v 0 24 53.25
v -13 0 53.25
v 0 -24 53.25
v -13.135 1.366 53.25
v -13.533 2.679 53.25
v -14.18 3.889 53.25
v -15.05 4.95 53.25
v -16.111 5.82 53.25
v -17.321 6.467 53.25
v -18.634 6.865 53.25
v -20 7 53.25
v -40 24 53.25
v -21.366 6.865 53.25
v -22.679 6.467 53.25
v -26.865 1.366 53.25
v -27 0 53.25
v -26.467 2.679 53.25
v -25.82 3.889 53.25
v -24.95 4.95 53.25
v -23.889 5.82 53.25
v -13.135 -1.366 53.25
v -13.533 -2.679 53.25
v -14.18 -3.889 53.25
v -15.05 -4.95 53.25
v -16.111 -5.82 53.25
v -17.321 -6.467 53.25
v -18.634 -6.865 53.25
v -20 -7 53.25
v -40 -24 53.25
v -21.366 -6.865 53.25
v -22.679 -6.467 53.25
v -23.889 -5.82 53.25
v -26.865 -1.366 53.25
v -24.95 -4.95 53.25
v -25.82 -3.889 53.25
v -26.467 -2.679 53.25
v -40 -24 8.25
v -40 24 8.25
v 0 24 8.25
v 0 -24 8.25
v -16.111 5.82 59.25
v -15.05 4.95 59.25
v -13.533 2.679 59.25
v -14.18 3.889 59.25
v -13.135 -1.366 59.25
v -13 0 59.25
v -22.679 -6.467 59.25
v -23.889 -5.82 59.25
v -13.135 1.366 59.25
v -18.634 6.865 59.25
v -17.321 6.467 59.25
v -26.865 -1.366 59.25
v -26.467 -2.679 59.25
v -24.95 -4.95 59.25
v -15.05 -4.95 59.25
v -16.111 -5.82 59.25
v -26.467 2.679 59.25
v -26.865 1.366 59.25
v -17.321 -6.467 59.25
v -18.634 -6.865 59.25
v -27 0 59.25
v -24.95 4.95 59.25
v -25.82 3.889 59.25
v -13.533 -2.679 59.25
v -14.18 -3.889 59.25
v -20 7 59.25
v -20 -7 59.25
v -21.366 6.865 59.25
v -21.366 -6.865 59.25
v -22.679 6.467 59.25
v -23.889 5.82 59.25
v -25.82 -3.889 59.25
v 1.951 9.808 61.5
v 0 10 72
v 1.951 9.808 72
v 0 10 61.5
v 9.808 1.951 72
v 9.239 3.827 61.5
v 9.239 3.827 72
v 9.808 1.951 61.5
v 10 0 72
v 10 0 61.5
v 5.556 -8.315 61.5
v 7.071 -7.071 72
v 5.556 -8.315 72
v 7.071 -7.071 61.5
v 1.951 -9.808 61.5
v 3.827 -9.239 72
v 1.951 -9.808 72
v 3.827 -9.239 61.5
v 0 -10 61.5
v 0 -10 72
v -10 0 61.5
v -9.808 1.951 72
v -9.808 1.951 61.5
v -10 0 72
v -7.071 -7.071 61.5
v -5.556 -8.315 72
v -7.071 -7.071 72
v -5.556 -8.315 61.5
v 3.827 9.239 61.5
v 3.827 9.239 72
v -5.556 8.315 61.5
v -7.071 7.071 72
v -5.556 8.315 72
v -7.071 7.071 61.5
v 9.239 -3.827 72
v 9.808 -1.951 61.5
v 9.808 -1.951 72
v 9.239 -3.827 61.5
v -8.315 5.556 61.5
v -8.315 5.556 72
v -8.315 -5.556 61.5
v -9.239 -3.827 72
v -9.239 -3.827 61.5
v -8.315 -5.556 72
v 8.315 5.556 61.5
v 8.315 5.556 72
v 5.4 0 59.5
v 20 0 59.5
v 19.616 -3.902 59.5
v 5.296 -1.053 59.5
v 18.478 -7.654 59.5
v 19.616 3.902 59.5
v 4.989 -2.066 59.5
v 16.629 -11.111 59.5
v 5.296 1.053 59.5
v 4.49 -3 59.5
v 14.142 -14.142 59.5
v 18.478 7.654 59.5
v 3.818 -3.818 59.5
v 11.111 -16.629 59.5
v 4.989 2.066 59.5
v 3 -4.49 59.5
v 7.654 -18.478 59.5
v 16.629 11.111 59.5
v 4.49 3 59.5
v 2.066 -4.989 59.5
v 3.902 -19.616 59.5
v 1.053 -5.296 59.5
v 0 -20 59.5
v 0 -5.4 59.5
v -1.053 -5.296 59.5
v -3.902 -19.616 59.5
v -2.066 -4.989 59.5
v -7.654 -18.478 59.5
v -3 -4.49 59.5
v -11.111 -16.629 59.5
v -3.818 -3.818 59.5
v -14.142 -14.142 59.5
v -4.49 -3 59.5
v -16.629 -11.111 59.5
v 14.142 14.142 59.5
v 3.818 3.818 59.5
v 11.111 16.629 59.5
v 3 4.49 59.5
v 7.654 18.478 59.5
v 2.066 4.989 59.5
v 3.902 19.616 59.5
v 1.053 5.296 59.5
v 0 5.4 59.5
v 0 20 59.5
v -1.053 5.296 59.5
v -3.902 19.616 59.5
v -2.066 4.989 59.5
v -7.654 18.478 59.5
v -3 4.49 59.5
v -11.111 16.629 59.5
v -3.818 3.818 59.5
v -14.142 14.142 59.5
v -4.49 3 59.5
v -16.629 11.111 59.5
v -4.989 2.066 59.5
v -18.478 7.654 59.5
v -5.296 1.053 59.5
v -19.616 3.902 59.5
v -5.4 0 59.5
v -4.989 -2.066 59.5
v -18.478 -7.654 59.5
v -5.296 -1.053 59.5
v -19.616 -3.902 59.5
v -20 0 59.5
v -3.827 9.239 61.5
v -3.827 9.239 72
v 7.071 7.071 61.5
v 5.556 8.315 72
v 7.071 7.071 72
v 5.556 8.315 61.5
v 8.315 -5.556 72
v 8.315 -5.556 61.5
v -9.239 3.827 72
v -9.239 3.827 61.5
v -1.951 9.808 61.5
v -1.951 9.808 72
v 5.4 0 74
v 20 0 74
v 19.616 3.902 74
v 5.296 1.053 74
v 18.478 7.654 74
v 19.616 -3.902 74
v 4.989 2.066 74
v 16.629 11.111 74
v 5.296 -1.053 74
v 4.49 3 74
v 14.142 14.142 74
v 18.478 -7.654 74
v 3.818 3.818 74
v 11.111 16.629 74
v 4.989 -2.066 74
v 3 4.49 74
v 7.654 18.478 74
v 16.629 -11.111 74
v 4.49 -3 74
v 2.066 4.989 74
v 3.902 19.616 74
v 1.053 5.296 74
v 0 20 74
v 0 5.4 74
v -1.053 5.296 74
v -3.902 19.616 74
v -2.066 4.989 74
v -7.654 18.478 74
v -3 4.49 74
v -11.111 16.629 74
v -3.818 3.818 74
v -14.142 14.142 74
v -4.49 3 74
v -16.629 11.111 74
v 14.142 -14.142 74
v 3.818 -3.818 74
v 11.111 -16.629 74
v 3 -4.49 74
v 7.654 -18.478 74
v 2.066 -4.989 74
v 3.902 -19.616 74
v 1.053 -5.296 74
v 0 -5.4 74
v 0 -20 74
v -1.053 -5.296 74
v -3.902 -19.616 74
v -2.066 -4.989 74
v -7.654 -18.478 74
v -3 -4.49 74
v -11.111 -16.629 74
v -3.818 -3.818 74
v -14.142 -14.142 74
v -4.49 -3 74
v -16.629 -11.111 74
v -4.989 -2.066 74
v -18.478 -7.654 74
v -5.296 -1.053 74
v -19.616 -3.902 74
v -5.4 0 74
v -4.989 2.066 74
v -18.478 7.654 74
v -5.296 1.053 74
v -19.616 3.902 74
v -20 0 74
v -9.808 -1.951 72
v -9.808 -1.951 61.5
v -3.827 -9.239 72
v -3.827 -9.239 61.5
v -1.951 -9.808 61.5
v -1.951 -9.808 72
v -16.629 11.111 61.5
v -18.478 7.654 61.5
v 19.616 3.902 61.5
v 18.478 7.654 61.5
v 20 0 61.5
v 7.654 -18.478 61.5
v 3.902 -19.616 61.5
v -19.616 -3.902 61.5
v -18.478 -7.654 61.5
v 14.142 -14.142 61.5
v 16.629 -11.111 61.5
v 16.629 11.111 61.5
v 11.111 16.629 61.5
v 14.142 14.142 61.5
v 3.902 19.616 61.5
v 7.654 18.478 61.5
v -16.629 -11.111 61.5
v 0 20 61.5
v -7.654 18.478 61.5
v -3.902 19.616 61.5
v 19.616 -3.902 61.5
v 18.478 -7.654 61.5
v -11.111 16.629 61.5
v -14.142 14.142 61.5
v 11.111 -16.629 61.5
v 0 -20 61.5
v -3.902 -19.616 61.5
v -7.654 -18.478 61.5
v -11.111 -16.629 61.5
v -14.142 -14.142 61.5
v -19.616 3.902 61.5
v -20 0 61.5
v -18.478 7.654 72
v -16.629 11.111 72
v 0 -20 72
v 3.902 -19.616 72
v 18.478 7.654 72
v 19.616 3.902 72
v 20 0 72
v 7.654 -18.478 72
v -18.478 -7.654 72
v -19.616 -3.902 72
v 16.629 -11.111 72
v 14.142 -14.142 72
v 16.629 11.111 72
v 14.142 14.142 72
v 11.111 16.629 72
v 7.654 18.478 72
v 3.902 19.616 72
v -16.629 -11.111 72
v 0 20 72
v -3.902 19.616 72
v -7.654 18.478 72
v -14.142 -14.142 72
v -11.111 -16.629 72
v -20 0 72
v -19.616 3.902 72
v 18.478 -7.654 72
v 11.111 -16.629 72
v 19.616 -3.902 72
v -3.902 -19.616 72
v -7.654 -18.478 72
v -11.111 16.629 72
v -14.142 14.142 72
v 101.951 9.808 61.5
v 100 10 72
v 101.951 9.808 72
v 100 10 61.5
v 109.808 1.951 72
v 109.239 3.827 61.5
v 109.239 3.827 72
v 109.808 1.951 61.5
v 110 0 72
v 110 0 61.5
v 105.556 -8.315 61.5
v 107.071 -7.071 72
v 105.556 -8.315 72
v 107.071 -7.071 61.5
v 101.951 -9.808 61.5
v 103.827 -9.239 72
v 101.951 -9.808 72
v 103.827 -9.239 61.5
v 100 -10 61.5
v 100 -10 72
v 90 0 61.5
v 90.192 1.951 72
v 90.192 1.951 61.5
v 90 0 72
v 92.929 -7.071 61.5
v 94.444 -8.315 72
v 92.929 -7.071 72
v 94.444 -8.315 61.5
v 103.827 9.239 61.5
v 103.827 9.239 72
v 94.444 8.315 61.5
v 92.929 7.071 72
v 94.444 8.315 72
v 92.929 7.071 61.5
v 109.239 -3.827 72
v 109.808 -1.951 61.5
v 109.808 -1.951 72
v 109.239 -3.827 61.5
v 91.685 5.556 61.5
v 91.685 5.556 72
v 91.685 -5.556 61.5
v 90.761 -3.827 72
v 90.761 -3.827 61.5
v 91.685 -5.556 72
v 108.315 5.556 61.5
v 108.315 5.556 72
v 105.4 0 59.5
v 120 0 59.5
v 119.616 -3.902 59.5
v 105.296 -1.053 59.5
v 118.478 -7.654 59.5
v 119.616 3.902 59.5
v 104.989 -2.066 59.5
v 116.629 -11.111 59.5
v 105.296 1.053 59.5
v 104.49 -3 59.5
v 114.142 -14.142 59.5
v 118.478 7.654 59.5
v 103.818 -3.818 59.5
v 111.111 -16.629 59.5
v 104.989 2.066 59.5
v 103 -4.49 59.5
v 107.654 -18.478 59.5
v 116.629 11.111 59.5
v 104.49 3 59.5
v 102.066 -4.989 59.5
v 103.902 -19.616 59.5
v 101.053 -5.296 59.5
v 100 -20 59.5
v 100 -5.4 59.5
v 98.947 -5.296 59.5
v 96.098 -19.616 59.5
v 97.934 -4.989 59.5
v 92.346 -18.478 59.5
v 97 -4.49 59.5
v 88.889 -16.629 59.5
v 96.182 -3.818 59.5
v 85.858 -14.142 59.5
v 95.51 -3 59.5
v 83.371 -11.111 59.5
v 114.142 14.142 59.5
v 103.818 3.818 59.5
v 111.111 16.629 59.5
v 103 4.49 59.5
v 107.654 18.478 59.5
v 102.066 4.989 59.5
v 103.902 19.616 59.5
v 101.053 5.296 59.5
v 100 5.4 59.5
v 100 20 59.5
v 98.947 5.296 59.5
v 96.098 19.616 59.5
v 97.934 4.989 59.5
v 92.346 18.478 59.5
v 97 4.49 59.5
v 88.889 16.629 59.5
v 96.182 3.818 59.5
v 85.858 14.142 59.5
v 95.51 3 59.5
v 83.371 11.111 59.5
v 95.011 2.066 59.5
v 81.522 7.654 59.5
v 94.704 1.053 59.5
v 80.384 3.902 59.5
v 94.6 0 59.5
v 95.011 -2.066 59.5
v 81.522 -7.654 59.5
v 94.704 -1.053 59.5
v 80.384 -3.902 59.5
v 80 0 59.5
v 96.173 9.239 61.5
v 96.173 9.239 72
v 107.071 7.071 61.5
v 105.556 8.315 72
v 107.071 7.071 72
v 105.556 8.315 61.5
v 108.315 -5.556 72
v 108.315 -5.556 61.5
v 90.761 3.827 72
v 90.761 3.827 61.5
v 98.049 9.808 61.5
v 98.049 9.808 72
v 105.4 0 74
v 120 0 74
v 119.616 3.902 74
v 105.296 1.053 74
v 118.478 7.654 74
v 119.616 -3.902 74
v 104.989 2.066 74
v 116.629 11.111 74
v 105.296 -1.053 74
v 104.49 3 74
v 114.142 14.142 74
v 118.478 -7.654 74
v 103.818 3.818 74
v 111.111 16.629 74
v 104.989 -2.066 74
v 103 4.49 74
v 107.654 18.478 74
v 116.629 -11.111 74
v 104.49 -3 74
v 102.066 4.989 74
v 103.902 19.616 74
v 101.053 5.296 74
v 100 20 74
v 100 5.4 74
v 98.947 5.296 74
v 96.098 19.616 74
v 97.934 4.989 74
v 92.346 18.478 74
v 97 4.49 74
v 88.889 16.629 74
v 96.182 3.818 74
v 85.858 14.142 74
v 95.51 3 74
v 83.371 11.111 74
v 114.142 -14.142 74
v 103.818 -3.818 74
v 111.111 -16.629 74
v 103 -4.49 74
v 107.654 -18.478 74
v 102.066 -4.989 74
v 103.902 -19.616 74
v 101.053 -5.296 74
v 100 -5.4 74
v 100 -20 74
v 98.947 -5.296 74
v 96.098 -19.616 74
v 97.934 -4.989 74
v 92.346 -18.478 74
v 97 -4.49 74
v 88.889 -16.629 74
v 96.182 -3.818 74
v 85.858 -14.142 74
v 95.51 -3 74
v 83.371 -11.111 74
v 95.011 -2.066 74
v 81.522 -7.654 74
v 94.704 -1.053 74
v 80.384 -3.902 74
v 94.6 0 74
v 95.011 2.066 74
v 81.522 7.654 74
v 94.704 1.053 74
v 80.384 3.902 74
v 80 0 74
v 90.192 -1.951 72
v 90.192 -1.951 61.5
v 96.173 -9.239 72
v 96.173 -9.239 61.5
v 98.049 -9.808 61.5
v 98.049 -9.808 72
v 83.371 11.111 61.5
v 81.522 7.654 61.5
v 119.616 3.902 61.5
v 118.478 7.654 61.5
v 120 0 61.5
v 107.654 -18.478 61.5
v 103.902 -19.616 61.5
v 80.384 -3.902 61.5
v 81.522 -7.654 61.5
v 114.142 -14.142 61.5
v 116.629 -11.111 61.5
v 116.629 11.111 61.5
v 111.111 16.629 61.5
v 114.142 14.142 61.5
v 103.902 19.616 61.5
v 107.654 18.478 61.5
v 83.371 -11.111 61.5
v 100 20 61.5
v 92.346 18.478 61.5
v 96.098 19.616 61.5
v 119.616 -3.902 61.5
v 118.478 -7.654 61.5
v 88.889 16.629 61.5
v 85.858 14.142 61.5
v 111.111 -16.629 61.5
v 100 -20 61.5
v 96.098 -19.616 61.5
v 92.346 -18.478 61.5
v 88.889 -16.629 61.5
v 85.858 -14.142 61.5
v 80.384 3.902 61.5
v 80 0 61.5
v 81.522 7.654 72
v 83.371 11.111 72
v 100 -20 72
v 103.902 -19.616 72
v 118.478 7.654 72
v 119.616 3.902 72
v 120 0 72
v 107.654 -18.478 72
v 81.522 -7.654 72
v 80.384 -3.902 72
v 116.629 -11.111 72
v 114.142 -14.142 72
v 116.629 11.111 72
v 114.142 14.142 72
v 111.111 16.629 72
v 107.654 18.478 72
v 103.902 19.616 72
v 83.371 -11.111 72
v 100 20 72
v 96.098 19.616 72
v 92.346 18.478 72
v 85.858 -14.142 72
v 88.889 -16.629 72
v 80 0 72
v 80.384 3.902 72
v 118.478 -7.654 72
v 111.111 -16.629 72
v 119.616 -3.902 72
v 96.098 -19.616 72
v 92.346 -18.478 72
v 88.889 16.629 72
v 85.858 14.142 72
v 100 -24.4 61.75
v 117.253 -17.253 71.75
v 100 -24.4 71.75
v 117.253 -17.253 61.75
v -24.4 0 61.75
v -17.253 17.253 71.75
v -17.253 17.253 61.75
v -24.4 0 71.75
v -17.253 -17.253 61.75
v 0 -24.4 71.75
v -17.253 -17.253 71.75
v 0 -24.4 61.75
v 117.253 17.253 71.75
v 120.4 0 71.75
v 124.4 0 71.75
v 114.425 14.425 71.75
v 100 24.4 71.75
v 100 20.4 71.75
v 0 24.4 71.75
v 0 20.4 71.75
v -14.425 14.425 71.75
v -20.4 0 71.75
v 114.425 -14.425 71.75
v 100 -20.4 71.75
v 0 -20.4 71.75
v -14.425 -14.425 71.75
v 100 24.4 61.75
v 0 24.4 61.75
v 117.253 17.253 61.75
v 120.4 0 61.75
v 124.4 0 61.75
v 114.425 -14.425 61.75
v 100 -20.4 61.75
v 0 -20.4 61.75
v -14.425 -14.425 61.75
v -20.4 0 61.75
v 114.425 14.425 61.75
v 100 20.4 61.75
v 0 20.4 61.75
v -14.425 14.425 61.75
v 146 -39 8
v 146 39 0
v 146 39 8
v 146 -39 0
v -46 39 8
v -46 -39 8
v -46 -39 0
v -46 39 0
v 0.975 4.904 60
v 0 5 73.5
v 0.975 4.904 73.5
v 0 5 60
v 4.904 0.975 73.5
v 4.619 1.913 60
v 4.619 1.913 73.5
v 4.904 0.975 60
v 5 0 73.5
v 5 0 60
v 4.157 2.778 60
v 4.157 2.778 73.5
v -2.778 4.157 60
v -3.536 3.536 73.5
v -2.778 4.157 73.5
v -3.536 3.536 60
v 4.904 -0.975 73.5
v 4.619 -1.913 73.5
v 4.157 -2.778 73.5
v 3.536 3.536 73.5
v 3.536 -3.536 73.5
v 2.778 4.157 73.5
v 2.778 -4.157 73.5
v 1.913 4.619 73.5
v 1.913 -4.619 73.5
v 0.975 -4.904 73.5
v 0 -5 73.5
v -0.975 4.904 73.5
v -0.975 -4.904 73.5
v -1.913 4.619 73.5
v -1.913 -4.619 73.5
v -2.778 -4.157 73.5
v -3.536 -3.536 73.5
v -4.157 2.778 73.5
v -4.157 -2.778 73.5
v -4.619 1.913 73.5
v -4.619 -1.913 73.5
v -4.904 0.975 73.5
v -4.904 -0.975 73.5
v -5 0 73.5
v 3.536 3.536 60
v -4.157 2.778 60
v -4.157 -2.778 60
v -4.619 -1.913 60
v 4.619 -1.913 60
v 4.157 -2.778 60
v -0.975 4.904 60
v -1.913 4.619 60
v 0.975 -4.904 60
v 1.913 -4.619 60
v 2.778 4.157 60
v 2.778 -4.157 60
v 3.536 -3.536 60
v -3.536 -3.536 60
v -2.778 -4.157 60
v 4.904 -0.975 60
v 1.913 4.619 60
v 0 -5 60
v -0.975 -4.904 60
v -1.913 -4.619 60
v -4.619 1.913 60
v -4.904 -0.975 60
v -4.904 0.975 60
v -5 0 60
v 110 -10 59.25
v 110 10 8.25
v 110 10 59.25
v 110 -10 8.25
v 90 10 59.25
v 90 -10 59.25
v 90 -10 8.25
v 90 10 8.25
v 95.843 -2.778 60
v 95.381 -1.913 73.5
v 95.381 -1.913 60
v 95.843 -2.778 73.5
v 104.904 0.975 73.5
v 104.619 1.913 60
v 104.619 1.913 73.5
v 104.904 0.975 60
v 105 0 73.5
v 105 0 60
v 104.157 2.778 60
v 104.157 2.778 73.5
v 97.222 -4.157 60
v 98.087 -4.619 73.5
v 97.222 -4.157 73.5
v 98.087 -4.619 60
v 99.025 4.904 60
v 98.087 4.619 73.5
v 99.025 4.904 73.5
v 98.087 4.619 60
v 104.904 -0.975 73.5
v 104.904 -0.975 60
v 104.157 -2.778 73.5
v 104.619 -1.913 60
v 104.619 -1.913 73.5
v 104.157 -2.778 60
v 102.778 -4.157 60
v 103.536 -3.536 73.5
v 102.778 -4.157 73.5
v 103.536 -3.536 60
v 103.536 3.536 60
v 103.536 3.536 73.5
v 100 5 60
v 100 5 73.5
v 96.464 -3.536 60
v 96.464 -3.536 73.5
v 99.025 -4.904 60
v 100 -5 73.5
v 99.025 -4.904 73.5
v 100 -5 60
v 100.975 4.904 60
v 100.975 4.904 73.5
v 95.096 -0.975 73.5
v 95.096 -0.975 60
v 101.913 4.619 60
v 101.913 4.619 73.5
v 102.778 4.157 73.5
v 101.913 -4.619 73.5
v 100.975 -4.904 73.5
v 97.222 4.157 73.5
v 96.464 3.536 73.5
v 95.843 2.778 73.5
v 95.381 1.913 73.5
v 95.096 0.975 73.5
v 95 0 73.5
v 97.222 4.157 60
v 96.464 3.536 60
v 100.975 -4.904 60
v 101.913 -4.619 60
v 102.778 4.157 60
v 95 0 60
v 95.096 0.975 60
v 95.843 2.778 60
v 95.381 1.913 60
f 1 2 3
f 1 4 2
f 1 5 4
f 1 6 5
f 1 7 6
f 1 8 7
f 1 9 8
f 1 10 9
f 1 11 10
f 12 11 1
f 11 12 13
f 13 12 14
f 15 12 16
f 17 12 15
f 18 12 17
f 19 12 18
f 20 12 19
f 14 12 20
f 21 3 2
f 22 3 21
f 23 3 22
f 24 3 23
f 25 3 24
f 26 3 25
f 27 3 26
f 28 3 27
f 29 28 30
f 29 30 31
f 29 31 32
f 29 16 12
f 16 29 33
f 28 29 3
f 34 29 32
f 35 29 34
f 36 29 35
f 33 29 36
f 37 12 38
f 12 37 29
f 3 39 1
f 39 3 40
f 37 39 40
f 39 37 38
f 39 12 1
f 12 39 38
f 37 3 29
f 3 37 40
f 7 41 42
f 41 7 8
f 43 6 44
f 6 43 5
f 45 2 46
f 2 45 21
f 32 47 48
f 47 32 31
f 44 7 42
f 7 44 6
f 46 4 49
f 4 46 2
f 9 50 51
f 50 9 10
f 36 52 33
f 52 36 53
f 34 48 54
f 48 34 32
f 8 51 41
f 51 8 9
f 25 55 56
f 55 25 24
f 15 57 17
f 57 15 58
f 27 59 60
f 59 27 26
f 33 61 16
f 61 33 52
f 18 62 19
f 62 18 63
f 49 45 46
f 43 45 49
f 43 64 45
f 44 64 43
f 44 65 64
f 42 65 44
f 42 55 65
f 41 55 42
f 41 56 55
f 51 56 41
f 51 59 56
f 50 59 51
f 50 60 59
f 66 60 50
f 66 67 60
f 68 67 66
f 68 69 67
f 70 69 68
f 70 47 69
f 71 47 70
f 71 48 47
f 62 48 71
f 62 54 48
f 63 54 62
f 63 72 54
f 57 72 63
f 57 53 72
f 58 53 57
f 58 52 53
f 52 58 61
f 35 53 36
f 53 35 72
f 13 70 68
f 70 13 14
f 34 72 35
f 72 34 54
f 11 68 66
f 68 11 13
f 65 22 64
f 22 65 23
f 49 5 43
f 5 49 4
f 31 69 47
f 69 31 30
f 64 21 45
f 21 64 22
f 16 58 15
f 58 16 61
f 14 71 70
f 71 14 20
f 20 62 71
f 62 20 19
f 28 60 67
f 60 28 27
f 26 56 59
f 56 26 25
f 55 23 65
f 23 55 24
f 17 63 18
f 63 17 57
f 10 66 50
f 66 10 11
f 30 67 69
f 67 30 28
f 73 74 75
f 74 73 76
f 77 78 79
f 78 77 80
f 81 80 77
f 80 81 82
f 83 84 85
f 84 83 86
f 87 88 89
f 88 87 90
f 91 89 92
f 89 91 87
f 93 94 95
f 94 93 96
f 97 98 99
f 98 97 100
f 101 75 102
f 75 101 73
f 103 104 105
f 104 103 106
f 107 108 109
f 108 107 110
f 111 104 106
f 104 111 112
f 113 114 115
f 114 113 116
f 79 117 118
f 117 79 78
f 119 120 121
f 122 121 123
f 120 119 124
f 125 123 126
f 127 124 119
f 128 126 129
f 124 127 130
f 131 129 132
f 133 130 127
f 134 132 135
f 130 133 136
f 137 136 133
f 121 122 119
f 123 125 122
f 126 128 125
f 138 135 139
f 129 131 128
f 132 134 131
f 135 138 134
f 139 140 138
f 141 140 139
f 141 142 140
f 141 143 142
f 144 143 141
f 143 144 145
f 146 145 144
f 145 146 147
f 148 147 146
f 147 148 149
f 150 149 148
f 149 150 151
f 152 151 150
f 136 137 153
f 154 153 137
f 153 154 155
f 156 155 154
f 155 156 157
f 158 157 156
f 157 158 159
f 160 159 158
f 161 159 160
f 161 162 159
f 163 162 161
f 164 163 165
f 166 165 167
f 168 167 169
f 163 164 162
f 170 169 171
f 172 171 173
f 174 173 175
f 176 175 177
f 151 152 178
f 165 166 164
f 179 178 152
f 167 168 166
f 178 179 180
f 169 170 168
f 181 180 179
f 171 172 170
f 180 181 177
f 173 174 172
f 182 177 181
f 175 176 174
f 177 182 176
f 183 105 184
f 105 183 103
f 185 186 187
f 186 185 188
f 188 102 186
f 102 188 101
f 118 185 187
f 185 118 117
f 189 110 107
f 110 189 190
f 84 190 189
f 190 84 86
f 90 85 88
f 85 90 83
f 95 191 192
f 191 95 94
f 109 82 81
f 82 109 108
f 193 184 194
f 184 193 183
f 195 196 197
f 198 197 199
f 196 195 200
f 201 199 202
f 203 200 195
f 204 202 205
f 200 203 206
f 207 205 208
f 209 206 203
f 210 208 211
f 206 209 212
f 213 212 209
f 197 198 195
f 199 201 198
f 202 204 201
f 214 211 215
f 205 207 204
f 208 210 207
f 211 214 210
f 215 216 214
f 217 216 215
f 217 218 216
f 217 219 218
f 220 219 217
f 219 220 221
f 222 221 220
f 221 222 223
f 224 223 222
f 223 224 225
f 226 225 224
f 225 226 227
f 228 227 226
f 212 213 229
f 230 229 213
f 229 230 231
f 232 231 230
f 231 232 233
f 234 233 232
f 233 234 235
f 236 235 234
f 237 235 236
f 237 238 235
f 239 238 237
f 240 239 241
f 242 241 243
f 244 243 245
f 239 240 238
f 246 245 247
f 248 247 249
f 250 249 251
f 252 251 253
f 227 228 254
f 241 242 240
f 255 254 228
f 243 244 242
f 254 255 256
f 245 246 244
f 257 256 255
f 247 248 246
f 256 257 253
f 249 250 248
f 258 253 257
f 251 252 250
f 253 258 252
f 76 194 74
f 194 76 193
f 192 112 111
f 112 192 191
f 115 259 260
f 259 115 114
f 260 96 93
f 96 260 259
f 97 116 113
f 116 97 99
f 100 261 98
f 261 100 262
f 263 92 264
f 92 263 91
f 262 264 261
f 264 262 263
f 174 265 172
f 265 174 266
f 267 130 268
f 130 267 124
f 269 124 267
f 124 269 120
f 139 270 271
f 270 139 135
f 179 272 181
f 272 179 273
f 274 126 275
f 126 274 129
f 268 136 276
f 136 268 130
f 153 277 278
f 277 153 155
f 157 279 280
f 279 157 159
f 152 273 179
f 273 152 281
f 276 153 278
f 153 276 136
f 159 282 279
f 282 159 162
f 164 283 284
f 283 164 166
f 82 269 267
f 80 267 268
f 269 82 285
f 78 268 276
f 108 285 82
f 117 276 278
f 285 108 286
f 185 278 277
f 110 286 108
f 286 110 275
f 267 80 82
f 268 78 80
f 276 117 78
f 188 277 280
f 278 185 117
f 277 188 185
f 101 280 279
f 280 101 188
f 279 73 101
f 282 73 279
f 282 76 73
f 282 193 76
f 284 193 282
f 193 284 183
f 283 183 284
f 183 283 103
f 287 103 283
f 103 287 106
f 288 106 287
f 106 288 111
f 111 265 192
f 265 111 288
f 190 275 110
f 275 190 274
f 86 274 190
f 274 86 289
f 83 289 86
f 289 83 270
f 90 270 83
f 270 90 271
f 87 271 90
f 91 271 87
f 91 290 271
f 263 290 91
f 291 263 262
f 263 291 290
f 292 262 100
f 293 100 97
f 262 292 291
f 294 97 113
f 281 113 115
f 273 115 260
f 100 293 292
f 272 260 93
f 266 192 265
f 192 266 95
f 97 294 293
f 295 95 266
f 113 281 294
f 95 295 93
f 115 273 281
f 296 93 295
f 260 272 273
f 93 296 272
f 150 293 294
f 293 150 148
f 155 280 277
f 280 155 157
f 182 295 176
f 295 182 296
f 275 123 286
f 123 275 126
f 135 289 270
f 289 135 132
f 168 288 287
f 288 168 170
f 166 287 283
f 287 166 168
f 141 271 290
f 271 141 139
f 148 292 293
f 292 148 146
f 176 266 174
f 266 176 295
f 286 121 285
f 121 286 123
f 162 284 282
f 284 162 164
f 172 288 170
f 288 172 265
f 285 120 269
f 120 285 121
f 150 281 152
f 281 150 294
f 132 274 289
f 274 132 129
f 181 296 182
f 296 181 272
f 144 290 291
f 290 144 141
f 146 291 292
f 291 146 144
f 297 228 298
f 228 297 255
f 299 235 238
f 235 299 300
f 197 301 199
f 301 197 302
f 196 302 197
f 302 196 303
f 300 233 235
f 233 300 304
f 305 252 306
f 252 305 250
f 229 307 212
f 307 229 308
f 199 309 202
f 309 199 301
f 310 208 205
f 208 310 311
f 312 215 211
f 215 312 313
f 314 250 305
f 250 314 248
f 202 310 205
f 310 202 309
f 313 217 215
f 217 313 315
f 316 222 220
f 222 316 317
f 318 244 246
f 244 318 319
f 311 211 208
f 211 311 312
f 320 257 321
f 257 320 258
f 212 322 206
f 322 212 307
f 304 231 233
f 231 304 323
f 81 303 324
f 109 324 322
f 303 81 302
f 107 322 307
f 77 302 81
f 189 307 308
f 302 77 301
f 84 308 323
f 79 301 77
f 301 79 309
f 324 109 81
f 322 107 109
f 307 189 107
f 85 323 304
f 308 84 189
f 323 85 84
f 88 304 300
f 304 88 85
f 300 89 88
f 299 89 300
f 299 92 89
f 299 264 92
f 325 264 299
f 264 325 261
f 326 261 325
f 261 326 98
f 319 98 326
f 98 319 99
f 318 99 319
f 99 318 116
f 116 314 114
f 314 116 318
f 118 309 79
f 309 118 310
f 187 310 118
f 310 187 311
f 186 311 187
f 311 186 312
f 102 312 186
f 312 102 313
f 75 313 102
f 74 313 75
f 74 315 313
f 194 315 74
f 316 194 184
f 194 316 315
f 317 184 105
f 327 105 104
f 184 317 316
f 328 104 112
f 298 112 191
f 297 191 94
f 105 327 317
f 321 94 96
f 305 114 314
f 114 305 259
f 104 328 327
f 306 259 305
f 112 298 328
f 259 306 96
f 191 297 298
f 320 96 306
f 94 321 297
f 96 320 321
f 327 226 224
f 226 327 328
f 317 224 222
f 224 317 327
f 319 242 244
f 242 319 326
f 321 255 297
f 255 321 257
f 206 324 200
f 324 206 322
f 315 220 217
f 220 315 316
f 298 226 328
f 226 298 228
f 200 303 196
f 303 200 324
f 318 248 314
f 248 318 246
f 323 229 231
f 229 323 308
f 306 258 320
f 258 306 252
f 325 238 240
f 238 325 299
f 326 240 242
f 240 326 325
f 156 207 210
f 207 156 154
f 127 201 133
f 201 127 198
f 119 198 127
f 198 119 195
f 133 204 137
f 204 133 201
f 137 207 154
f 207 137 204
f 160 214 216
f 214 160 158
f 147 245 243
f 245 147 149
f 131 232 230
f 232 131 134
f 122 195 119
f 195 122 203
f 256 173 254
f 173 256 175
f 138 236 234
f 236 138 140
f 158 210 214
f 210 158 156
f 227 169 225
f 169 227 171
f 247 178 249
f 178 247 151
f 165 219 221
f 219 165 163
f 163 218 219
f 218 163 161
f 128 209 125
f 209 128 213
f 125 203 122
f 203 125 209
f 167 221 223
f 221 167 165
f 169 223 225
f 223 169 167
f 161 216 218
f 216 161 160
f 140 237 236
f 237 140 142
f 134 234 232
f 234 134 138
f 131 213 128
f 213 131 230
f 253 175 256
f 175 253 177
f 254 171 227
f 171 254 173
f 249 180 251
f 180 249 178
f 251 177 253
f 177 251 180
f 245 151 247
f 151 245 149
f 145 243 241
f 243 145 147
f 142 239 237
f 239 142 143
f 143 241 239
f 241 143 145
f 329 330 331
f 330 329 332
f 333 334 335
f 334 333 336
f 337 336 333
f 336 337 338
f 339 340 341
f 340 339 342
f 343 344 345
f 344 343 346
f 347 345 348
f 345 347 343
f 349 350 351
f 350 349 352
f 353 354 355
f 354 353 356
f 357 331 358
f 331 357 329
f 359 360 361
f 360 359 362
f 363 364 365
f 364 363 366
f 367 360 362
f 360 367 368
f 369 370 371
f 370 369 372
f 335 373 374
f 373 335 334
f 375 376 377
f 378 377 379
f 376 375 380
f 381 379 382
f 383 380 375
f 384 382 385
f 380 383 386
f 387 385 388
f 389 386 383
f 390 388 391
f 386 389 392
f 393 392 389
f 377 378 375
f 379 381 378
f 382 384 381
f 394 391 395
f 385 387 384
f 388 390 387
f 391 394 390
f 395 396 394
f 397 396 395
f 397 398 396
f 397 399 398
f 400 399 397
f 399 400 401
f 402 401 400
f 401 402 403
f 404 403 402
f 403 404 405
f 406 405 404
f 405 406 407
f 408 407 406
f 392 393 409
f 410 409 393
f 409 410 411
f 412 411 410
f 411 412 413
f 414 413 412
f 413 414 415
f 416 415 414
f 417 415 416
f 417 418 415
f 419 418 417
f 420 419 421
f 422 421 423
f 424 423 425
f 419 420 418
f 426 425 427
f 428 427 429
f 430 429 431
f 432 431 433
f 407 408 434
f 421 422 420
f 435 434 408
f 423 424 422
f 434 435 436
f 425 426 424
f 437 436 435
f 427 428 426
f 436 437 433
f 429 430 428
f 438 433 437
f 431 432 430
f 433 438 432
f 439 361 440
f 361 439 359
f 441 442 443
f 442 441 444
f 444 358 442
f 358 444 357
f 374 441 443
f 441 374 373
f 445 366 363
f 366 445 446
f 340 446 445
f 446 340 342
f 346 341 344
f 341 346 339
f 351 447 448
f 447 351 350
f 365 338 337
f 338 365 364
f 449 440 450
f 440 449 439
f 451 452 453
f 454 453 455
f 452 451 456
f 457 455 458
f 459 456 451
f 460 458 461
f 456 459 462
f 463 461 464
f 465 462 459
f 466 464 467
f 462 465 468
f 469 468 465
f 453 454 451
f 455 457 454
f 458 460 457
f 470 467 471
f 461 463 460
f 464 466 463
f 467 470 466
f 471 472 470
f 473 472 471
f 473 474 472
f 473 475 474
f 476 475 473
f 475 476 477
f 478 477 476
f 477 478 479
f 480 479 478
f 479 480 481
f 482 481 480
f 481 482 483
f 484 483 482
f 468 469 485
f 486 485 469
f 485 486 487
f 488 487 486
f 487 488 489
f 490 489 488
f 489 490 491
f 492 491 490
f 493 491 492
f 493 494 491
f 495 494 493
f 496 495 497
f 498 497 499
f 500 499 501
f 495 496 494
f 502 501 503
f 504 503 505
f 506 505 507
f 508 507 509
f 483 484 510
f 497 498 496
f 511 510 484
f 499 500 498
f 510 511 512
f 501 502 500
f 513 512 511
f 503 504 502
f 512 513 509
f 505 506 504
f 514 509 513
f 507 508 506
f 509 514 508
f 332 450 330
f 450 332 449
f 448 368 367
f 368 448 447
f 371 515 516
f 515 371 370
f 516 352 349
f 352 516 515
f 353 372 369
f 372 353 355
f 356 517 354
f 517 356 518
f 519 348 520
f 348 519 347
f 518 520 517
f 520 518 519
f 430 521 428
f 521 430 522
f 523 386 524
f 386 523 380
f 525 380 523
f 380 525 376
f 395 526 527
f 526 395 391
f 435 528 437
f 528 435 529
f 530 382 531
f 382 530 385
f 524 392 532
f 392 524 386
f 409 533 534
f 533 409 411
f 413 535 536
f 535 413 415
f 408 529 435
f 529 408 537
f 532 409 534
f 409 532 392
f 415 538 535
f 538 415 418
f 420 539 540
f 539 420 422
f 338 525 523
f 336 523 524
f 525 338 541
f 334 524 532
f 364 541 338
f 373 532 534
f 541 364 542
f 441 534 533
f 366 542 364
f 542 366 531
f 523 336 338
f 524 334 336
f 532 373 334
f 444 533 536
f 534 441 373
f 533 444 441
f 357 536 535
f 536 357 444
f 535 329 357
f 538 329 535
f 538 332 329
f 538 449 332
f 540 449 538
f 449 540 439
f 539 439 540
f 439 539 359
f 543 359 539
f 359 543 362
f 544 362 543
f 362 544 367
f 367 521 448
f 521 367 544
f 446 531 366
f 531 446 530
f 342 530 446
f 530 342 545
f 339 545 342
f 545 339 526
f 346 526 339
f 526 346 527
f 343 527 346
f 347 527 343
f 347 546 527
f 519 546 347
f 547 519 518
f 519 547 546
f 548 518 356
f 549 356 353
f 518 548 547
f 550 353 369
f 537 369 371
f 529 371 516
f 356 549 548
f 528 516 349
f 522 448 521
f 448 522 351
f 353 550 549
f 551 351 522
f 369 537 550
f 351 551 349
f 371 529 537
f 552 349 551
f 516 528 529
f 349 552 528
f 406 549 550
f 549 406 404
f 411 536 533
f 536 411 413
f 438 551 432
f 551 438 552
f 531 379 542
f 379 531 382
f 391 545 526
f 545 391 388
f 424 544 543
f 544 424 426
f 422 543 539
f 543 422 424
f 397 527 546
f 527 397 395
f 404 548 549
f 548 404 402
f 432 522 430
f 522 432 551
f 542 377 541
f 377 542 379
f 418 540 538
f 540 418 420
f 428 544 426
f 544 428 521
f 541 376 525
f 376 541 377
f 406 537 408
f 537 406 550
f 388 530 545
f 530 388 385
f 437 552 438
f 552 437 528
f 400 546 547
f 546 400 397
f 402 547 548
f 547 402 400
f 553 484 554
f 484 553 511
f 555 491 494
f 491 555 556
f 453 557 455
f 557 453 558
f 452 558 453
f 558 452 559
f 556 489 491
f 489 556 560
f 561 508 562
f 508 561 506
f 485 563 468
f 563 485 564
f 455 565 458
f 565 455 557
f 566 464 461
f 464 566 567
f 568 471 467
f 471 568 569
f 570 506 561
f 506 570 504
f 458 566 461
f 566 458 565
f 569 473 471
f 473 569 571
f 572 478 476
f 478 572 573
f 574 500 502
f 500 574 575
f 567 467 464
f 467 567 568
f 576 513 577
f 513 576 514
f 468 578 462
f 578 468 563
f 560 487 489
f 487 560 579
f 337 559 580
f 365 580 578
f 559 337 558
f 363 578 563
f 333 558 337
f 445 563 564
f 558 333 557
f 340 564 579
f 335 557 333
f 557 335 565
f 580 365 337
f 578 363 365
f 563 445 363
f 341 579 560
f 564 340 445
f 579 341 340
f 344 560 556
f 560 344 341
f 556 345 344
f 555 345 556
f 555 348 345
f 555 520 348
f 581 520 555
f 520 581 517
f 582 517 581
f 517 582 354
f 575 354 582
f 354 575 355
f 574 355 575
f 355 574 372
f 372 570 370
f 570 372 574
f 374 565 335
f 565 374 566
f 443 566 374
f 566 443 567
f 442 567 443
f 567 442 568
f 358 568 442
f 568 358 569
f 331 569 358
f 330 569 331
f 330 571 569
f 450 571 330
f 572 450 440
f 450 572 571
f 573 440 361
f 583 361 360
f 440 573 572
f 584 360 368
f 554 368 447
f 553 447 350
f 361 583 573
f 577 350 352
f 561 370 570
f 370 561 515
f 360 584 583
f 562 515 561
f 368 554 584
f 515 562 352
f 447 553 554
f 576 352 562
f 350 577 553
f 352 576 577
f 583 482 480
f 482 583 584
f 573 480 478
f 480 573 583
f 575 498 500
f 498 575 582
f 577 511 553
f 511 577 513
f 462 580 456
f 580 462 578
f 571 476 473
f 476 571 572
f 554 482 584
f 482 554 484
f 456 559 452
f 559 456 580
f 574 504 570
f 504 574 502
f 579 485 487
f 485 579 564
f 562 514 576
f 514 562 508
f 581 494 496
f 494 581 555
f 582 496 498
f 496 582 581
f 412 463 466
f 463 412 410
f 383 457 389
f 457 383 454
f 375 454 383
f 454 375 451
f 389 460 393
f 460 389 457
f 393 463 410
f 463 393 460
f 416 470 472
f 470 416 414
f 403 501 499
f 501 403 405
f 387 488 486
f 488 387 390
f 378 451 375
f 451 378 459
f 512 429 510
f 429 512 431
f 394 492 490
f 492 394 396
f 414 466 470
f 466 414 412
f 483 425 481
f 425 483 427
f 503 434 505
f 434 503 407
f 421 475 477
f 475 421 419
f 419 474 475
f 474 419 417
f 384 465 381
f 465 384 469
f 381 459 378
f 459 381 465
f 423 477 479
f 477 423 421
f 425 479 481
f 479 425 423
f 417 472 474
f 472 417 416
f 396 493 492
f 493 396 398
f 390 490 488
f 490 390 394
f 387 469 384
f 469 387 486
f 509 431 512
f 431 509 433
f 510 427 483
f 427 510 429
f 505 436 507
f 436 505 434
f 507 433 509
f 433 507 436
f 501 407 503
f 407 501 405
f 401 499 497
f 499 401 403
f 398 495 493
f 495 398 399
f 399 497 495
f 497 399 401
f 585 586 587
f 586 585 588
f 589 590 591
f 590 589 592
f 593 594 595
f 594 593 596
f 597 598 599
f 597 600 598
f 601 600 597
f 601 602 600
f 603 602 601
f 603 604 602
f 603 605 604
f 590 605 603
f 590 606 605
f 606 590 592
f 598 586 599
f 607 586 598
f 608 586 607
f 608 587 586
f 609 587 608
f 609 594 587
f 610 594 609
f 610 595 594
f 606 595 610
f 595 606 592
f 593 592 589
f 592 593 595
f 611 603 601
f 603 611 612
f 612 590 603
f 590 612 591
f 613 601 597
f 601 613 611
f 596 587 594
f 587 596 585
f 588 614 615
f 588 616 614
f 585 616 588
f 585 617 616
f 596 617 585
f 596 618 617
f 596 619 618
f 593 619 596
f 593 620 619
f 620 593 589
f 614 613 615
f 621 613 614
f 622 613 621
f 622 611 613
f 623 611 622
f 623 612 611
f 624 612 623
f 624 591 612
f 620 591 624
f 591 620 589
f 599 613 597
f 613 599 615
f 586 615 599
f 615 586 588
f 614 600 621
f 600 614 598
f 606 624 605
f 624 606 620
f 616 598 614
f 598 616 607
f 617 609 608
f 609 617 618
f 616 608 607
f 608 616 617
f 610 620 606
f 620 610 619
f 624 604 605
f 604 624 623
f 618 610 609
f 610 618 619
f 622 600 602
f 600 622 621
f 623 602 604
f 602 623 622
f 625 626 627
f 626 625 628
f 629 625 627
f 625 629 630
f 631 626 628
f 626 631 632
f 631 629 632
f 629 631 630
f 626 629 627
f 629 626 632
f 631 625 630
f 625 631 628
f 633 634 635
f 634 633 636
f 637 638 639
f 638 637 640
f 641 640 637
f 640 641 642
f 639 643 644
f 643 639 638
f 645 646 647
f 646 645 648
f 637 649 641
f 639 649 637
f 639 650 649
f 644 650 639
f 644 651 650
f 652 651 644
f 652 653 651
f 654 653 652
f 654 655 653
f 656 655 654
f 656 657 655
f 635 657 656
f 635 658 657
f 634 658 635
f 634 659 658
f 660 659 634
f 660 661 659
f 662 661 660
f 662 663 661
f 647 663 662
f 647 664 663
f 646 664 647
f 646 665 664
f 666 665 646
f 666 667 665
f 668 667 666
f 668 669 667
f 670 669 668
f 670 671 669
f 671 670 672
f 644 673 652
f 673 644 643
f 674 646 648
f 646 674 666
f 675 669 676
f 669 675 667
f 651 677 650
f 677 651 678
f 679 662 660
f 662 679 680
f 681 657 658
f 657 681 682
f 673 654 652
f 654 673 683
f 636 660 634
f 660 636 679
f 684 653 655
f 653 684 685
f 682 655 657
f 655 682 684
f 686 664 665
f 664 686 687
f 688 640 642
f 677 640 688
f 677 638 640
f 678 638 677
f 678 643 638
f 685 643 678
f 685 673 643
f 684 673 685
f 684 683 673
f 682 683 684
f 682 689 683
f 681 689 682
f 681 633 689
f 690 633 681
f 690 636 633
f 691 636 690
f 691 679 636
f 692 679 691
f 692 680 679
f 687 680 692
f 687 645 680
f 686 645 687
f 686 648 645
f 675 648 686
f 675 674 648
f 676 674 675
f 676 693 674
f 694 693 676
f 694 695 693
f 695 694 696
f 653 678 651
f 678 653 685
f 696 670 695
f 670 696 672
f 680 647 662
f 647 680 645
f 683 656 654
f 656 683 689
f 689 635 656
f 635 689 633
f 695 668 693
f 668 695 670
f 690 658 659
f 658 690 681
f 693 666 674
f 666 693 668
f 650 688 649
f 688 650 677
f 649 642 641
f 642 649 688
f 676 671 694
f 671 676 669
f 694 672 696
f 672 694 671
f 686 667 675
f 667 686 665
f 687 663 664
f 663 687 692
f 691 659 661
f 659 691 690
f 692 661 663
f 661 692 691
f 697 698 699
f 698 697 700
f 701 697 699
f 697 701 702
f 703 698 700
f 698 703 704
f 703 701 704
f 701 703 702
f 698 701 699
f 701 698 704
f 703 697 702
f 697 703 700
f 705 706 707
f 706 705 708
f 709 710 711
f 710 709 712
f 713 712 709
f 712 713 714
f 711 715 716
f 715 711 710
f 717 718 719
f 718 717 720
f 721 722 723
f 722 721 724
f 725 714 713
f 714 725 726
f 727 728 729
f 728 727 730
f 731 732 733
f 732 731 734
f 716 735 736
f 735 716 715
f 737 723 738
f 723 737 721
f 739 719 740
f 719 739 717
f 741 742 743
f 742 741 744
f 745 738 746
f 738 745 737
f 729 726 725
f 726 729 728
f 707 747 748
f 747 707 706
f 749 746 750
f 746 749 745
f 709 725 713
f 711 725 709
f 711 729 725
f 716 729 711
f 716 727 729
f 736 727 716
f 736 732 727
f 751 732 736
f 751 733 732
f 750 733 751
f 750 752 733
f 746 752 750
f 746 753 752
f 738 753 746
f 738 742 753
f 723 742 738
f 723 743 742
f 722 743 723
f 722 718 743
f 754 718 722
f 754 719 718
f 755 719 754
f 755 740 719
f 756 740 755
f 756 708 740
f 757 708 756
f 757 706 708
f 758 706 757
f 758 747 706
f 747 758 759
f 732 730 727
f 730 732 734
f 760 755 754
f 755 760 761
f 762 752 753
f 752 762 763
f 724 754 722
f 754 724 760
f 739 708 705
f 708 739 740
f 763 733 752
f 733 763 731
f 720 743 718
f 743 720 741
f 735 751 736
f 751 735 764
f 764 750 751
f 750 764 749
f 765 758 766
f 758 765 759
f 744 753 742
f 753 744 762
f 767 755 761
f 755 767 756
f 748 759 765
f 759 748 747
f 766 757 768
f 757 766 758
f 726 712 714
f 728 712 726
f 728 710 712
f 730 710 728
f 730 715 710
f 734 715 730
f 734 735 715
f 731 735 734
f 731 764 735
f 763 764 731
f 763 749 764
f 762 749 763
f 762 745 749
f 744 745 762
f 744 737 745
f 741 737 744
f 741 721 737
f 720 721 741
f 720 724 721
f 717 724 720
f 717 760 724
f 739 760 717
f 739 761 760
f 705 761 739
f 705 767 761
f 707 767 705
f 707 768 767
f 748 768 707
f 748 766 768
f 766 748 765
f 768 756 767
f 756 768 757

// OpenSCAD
$fn = 32;

// ------------------------------------------------------------------------
// Motor belt drive: span 100 mm, pulleys d40, belt 10 mm wide
// Every part is its own module, assembly() places every instance.
// ------------------------------------------------------------------------

// --- part 1 ---
module base_plate() {
  difference() {
    translate([-96, -39, 0]) cube([192, 78, 8]);
  }
}

// --- part 2 ---
module motor() {
  union() {
    translate([-22.5, -24, 0]) cube([45, 48, 40]);
    translate([25.5, 0, 20]) rotate([0, 90, 0]) cylinder(h = 6, d = 14, center = true);
  }
}

// --- part 3 ---
module drive_shaft() {
  translate([0, 0, -6.75]) cylinder(h = 13.5, d = 10);
}

// --- part 4 ---
module pulley_drive() {
  difference() {
    union() {
      cylinder(h = 14.5, d = 20);
      cylinder(h = 2, d = 40);
      translate([0, 0, 12.5]) cylinder(h = 2, d = 40);
    }
    translate([0, 0, -1]) cylinder(h = 16.5, d = 10.8);
  }
}

// --- part 5 ---
module idler_post() {
  translate([-10, -10, 0]) cube([20, 20, 51]);
}

// --- part 6 ---
module driven_shaft() {
  translate([0, 0, -6.75]) cylinder(h = 13.5, d = 10);
}

// --- part 7 ---
module pulley_driven() {
  difference() {
    union() {
      cylinder(h = 14.5, d = 20);
      cylinder(h = 2, d = 40);
      translate([0, 0, 12.5]) cylinder(h = 2, d = 40);
    }
    translate([0, 0, -1]) cylinder(h = 16.5, d = 10.8);
  }
}

// --- part 8 ---
module drive_belt() {
  difference() {
    linear_extrude(height = 10) polygon(points = concat([for (a = [90 : 45 : 270]) [24.4 * cos(a), 24.4 * sin(a)]], [for (a = [270 : 45 : 450]) [100 + 24.4 * cos(a), 24.4 * sin(a)]]));
    translate([0, 0, -1]) linear_extrude(height = 12) polygon(points = concat([for (a = [90 : 45 : 270]) [20.4 * cos(a), 20.4 * sin(a)]], [for (a = [270 : 45 : 450]) [100 + 20.4 * cos(a), 20.4 * sin(a)]]));
  }
}

// --- assembly ---
module assembly() {
  color([0.80, 0.24, 0.20]) translate([50, 0, 0]) rotate([0, 0, 0]) base_plate();
  color([0.20, 0.45, 0.75]) translate([0, 0, 30.75]) rotate([0, 270, 0]) motor();
  color([0.25, 0.62, 0.32]) translate([0, 0, 66.75]) rotate([0, 0, 0]) drive_shaft();
  color([0.92, 0.70, 0.18]) translate([0, 0, 59.5]) rotate([0, 0, 0]) pulley_drive();
  color([0.58, 0.35, 0.70]) translate([100, 0, 8.25]) rotate([0, 0, 0]) idler_post();
  color([0.16, 0.66, 0.66]) translate([100, 0, 66.75]) rotate([0, 0, 0]) driven_shaft();
  color([0.85, 0.48, 0.18]) translate([100, 0, 59.5]) rotate([0, 0, 0]) pulley_driven();
  color([0.55, 0.60, 0.65]) translate([0, 0, 61.75]) rotate([0, 0, 0]) drive_belt();
}

assembly();
